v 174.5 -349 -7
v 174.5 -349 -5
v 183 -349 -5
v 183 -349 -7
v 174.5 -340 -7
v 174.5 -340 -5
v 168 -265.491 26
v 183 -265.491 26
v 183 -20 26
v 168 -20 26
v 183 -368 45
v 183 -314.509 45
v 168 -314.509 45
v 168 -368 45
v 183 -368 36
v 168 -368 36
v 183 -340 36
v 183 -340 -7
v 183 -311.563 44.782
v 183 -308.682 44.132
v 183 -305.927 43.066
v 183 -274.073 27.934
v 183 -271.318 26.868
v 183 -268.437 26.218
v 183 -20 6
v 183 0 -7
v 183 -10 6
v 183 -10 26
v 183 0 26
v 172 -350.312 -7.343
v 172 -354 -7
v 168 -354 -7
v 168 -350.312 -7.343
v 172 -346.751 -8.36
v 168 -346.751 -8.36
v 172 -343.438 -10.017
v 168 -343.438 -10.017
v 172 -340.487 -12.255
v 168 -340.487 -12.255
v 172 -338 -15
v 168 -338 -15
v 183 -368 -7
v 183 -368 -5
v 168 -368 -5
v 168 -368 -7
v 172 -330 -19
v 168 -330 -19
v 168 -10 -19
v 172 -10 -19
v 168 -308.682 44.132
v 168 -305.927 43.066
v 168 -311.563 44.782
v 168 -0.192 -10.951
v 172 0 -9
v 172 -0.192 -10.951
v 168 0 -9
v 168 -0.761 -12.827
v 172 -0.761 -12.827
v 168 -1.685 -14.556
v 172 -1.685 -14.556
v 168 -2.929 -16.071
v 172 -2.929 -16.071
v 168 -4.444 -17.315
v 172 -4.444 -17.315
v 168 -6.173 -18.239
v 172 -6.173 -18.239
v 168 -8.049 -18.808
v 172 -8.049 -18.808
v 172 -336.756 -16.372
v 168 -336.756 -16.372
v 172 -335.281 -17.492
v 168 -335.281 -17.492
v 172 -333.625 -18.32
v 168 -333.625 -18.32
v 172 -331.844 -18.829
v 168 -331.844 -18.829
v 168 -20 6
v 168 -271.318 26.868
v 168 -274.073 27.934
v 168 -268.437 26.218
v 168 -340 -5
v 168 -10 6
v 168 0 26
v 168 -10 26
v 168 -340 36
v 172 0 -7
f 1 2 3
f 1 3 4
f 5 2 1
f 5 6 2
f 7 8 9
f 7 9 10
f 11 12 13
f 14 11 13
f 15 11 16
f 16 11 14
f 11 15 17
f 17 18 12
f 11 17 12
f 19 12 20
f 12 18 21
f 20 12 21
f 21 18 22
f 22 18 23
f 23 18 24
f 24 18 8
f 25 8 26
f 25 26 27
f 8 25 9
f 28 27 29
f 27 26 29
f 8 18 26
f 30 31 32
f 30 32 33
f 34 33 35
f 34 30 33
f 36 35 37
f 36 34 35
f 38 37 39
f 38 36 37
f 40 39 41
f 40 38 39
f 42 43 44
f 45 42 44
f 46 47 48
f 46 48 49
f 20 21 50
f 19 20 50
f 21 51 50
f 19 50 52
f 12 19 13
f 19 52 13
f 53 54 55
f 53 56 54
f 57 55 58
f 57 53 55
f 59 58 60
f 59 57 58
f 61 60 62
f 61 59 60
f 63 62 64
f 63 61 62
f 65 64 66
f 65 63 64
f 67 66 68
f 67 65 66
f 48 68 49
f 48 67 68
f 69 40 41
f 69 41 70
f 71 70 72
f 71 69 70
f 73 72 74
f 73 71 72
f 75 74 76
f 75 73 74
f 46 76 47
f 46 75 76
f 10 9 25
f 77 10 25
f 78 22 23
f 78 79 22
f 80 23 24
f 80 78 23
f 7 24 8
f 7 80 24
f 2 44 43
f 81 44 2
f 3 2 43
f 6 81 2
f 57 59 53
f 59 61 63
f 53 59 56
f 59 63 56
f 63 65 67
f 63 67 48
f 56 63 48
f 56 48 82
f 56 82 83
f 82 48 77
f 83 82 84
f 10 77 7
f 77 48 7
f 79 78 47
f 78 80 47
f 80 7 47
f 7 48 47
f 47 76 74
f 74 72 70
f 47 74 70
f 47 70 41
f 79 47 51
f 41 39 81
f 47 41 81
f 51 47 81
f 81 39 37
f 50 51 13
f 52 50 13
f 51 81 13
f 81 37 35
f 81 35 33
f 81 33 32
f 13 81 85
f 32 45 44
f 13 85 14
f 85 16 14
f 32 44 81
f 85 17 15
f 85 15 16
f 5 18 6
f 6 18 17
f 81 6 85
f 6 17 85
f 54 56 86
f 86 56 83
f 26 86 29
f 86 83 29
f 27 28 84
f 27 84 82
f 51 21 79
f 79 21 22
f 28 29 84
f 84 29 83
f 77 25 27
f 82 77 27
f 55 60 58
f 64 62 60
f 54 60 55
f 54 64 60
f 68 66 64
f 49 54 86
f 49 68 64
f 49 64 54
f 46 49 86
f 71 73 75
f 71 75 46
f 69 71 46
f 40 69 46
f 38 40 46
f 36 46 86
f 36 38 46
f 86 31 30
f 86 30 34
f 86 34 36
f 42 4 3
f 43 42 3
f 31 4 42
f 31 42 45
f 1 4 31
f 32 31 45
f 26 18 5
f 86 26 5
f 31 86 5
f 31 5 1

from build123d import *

# Parameters (mm, degrees)
EXTRUDE_1_DEPTH        = 26
EXTRUDE_2_DEPTH        = 19
FILLET_1_R             = 10
SKETCH_5_W             = 161
SKETCH_5_H             = 6
CUT_EXTRUDE_1_DEPTH    = 52
SKETCH_1_5_W           = 11
SKETCH_1_5_H           = 340
EXTRUDE_4_DEPTH        = 7
SKETCH_6_W             = 1.9
SKETCH_6_H             = 2
SKETCH_6_W_2           = 6.6
EXTRUDE_5_DEPTH        = 28
SKETCH_6_3_W           = 6.6
SKETCH_6_3_H           = 2
CUT_EXTRUDE_2_DEPTH    = 5
FILLET_2_R             = 20
SKETCH_6_4_W           = 15
SKETCH_6_4_H           = 10
SKETCH_6_4_H_2         = 9
EXTRUDE_6_DEPTH        = 30
SKETCH_6_5_W           = 15
SKETCH_6_5_H           = 9
EXTRUDE_7_DEPTH        = 28
EXTRUDE_8_DEPTH        = 15
FILLET_3_R             = 20
FILLET_3_OF_MIRROR_2_R = 20
FILLET_4_R             = 20
SKETCH_11_W            = 20
SKETCH_11_H            = 20
CUT_EXTRUDE_3_DEPTH    = 617
SKETCH_10_W            = 20
SKETCH_10_H            = 10
CUT_EXTRUDE_4_DEPTH    = 617
SKETCH_13_W            = 2
SKETCH_13_H            = 9
CUT_EXTRUDE_8_DEPTH    = 8.5


with BuildPart() as part:
    # 스케치1 → 보스-돌출1 (new body)
    with BuildSketch(Plane.XY):
        Polygon((-168, 0), (168, 0), (183, 0), (183, -340), (168, -340), (168, -20), (-168, -20), (-168, -340), (-183, -340), (-183, 0), align=None)
    extrude(amount=EXTRUDE_1_DEPTH)

    # 스케치1<4> → 보스-돌출2 (add)
    with BuildSketch(Plane.XY):
        Polygon((172, 0), (168, 0), (168, -20), (168, -340), (172, -340), align=None)
        Polygon((-168, -20), (-168, 0), (-172, 0), (-172, -340), (-168, -340), align=None)
    extrude(amount=-EXTRUDE_2_DEPTH)

    # 필렛1
    fillet_1_edges = [part.edges().sort_by_distance(p)[0] for p in [
        (170, 0, -19),
        (170, -340, -19),
        (-170, -340, -19),
        (-170, 0, -19),
    ]]
    fillet(fillet_1_edges, radius=FILLET_1_R)

    # 스케치5 → 컷-돌출1 (cut)
    with BuildSketch(Plane(origin=(0, 0, 0), x_dir=(1, 0, 0), z_dir=(0, 1, 0))):
        with Locations((-87.5, -3)):
            Rectangle(SKETCH_5_W, SKETCH_5_H)
        with Locations((87.5, -3)):
            Rectangle(SKETCH_5_W, SKETCH_5_H)
    extrude(amount=-CUT_EXTRUDE_1_DEPTH, mode=Mode.SUBTRACT)

    # 스케치1<5> → 보스-돌출4 (add)
    with BuildSketch(Plane.XY):
        with Locations((177.5, -170)):
            Rectangle(SKETCH_1_5_W, SKETCH_1_5_H)
        with Locations((-177.5, -170)):
            Rectangle(SKETCH_1_5_W, SKETCH_1_5_H)
    extrude(amount=-EXTRUDE_4_DEPTH)

    # 스케치6 → 보스-돌출5 (add)
    with BuildSketch(Plane.XZ.offset(340)):
        with Locations((-182.05, -6)):
            Rectangle(SKETCH_6_W, SKETCH_6_H)
        with Locations((-177.8, -6)):
            Rectangle(SKETCH_6_W_2, SKETCH_6_H)
        Polygon((-174.5, -7), (-172, -7), (-168, -7), (-168, -5), (-174.5, -5), align=None)
    extrude_5 = extrude(amount=EXTRUDE_5_DEPTH)

    # 스케치6<3> → 컷-돌출2 (cut)
    with BuildSketch(Plane.XZ.offset(340)):
        with Locations((-177.8, -6)):
            Rectangle(SKETCH_6_3_W, SKETCH_6_3_H)
    cut_extrude_2 = extrude(amount=CUT_EXTRUDE_2_DEPTH, mode=Mode.SUBTRACT)

    # 필렛2
    # the kernel refuses this fillet: 20 mm, written as the material it adds along each edge
    with BuildSketch(Plane(origin=(-172, -340, -7), x_dir=(0, -1, 0), z_dir=(1, 0, 0))) as fillet_2_piece_1:
        with BuildLine():
            CenterArc((14, 20), FILLET_2_R, 216.869897646, 53.130102354)
            Line((-2, 8), (-3.6, 6.8))
            ThreePointArc((-3.6, 6.8), (-2, 2), (-2, 0))
            Line((-2, 0), (0, -2))
            Line((0, -2), (14, -2))
            Line((14, -2), (14, 0))
        make_face()
    extrude(amount=4)

    # 스케치6<4> → 보스-돌출6 (add)
    with BuildSketch(Plane.XZ.offset(340)):
        with Locations((-175.5, 31)):
            Rectangle(SKETCH_6_4_W, SKETCH_6_4_H)
        with Locations((-175.5, 40.5)):
            Rectangle(SKETCH_6_4_W, SKETCH_6_4_H_2)
    extrude_6 = extrude(amount=-EXTRUDE_6_DEPTH)

    # 스케치6<5> → 보스-돌출7 (add)
    with BuildSketch(Plane.XZ.offset(340)):
        with Locations((-175.5, 40.5)):
            Rectangle(SKETCH_6_5_W, SKETCH_6_5_H)
    extrude_7 = extrude(amount=EXTRUDE_7_DEPTH)

    # 스케치9 → 보스-돌출8 (add)
    with BuildSketch(Plane.ZY.offset(183)):
        Polygon((26, -310), (45, -310), (26, -270), align=None)
    extrude_8 = extrude(amount=-EXTRUDE_8_DEPTH)

    # 필렛3
    fillet_3_edges = [part.edges().sort_by_distance(p)[0] for p in [
        (-175.5, -310, 45),
        (-175.5, -270, 26),
    ]]
    fillet(fillet_3_edges, radius=FILLET_3_R)

    # 대칭 복사2: 보스-돌출5, 컷-돌출2, 보스-돌출6, 보스-돌출7, 보스-돌출8 across plane
    add(extrude_5.mirror(Plane(origin=(0, 0, 0), x_dir=(0, 0, 1), z_dir=(1, 0, 0))))
    add(cut_extrude_2.mirror(Plane(origin=(0, 0, 0), x_dir=(0, 0, 1), z_dir=(1, 0, 0))), mode=Mode.SUBTRACT)
    add(extrude_6.mirror(Plane(origin=(0, 0, 0), x_dir=(0, 0, 1), z_dir=(1, 0, 0))))
    add(extrude_7.mirror(Plane(origin=(0, 0, 0), x_dir=(0, 0, 1), z_dir=(1, 0, 0))))
    add(extrude_8.mirror(Plane(origin=(0, 0, 0), x_dir=(0, 0, 1), z_dir=(1, 0, 0))))

    # 필렛3 of 대칭 복사2
    fillet_3_of_mirror_2_edges = [part.edges().sort_by_distance(p)[0] for p in [
        (175.5, -310, 45),
        (175.5, -270, 26),
    ]]
    fillet(fillet_3_of_mirror_2_edges, radius=FILLET_3_OF_MIRROR_2_R)

    # 필렛4
    # the kernel refuses this fillet: 20 mm, written as the material it adds along each edge
    with BuildSketch(Plane(origin=(172, -340, -7), x_dir=(0, 0.24253562503633938, -0.9701425001453302), z_dir=(-1, 0, 0))) as fillet_4_piece_1:
        with BuildLine():
            CenterArc((16.007351252, 18.432707503), FILLET_4_R, 194.036243468, 53.130102354)
            Line((-3.395498751, 13.581995002), (-5.335783751, 13.096923752))
            Line((-5.335783751, 13.096923752), (-1.940285, -0.48507125))
            Line((-1.940285, -0.48507125), (0.48507125, -1.940285))
            ThreePointArc((0.48507125, -1.940285), (2.42535625, -1.45521375), (7.470097251, -1.84327075))
            Line((7.470097251, -1.84327075), (8.246211251, 0))
        make_face()
    extrude(amount=4)

    # 스케치11 → 컷-돌출3 (cut)
    with BuildSketch(Plane.ZY.offset(-168)):
        with BuildLine():
            ThreePointArc((45, -314.508610159), (44.510394688, -310.110371974), (43.065550087, -305.927473868))
            Line((43.065550087, -305.927473868), (27.934449913, -274.072526132))
            ThreePointArc((27.934449913, -274.072526132), (26.489605312, -269.889628026), (26, -265.491389841))
            Line((26, -265.491389841), (26, -20))
            Line((26, -20), (6, -20))
            Line((6, -20), (6, 0))
            Line((6, 0), (-7, 0))
            Line((-7, 0), (-7, -354))
            Line((-7, -354), (-7, -368))
            Line((-7, -368), (-5, -368))
            Line((-5, -368), (-5, -340))
            Line((-5, -340), (36, -340))
            Line((36, -340), (36, -368))
            Line((36, -368), (45, -368))
            Line((45, -368), (45, -314.508610159))
        make_face()
        with Locations((16, -10)):
            Rectangle(SKETCH_11_W, SKETCH_11_H)
        with BuildLine():
            Line((-7, -354), (-7, 0))
            Line((-7, 0), (-9, 0))
            ThreePointArc((-9, 0), (-16.071067812, -2.928932188), (-19, -10))
            Line((-19, -10), (-19, -330))
            ThreePointArc((-19, -330), (-17.94427191, -334.472135955), (-15, -338))
            ThreePointArc((-15, -338), (-9.11145618, -345.05572809), (-7, -354))
        make_face()
    extrude(amount=CUT_EXTRUDE_3_DEPTH, mode=Mode.SUBTRACT)

    # 스케치10 → 컷-돌출4 (cut)
    with BuildSketch(Plane(origin=(183, 0, 0), x_dir=(0, 0, -1), z_dir=(1, 0, 0))):
        with Locations((-16, -15)):
            Rectangle(SKETCH_10_W, SKETCH_10_H)
    extrude(amount=-CUT_EXTRUDE_4_DEPTH, mode=Mode.SUBTRACT)

    # 스케치13 → 컷-돌출8 (cut)
    with BuildSketch(Plane(origin=(183, 0, 0), x_dir=(0, 0, -1), z_dir=(1, 0, 0))):
        with Locations((6, -344.5)):
            Rectangle(SKETCH_13_W, SKETCH_13_H)
    extrude(amount=-CUT_EXTRUDE_8_DEPTH, mode=Mode.SUBTRACT)


solid = part.part
